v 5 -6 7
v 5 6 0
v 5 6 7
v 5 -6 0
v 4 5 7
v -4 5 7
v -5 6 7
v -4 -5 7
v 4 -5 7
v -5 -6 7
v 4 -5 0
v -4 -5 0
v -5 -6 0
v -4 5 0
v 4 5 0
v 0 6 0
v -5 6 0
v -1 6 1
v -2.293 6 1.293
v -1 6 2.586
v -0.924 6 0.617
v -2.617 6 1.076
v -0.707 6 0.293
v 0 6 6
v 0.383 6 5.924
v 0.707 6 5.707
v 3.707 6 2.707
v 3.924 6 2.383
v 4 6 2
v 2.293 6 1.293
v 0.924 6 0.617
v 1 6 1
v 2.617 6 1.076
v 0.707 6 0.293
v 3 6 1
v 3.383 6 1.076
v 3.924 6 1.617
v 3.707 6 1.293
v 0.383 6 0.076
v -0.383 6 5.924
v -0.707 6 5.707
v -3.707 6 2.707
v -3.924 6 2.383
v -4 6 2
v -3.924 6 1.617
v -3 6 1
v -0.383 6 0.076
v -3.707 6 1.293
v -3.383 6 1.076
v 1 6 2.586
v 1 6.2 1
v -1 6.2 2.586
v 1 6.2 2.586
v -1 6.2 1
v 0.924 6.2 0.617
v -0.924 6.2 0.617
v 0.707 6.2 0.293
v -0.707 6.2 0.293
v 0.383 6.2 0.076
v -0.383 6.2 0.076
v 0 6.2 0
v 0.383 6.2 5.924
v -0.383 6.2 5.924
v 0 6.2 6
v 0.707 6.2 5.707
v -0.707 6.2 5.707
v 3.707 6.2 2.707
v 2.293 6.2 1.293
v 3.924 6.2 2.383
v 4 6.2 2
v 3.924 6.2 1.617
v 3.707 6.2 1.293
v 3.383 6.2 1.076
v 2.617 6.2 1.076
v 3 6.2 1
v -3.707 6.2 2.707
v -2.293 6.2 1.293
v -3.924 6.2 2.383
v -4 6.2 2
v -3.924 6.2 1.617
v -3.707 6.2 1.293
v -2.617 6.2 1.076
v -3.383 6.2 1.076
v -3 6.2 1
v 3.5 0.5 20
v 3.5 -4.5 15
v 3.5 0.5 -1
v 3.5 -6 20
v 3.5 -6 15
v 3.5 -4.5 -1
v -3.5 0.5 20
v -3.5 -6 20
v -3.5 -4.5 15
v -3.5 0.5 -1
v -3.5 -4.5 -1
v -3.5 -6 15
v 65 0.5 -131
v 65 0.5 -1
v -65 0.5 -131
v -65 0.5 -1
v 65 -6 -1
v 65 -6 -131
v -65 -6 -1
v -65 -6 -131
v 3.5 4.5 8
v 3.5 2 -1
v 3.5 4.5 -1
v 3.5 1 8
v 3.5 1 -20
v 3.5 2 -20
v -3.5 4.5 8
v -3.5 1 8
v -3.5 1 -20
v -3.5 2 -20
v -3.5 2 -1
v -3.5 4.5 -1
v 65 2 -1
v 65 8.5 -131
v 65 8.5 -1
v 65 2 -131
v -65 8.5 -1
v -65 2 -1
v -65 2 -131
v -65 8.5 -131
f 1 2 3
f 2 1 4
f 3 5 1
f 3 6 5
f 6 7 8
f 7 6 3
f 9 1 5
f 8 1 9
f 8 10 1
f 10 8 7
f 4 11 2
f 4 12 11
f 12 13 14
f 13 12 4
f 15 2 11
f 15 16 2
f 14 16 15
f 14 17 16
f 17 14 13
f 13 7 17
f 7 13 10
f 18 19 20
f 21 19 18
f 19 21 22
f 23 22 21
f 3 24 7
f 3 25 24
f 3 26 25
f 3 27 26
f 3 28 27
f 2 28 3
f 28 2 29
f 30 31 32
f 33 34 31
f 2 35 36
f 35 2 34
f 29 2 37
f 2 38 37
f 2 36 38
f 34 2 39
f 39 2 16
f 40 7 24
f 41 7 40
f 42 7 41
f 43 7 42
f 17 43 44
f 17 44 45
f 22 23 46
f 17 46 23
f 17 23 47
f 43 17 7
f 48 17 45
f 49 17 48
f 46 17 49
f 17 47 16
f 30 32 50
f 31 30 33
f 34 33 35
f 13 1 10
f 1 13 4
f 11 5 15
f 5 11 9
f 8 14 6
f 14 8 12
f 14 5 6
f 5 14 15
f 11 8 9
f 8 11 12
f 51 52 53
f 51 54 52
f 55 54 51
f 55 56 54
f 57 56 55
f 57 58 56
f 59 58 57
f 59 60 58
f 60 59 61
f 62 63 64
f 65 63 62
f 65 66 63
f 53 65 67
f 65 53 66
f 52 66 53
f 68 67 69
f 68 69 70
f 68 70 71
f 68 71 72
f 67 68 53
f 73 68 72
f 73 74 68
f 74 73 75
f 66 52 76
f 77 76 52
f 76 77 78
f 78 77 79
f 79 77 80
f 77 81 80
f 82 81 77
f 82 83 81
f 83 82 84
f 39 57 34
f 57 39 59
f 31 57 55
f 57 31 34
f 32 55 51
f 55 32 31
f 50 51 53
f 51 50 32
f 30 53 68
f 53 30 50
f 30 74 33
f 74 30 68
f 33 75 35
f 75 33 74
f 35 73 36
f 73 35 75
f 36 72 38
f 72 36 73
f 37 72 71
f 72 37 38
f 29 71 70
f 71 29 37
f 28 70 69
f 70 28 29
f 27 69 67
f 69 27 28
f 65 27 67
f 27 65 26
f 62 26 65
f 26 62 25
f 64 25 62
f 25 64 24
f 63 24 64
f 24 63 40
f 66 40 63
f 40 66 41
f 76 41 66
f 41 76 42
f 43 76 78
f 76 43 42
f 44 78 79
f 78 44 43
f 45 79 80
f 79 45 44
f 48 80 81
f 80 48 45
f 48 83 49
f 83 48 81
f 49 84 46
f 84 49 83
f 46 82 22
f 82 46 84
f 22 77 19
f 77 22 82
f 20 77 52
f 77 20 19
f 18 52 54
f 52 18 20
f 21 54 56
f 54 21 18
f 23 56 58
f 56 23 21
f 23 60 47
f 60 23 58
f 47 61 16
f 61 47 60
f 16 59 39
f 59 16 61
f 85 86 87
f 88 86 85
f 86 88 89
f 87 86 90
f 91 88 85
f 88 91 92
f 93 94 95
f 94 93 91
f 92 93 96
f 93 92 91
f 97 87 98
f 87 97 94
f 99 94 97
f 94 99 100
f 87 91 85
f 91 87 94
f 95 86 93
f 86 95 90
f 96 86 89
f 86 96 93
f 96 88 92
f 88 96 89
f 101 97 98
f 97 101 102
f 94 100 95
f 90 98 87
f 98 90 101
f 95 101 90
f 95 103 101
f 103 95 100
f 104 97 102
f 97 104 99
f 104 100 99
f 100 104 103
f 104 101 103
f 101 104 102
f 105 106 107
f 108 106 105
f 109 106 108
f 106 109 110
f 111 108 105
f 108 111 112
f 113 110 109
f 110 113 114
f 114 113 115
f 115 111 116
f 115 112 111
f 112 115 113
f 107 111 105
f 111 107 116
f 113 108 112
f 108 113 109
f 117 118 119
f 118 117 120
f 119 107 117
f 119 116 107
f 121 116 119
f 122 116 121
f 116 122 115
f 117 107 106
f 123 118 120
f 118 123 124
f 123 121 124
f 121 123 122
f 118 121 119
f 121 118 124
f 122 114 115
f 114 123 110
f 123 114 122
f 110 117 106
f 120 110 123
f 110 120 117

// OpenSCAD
module thin_wall_cube(dims, thick=1) {
    /* centers in XY */
    inner_dim0 = dims[0] - thick * 2;
    inner_dim1 = dims[1] - thick * 2;
    difference() {
        translate([-dims[0]/2,-dims[1]/2,0])
            cube(dims);
        translate([-inner_dim0/2,-inner_dim1/2,-1])
            cube([inner_dim0, inner_dim1, dims[2] + 2]);
    }
}

module arrow(l=10, w=3, r=1) {
    /* stem */
    hull() {
        circle(r=r);
        translate([0,-l]) circle(r=r);
    }
    /* left */
    hull() {
        circle(r=r);
        translate([-w, -w]) circle(r=r);
    }
    /* right */
    hull() {
        circle(r=r);
        translate([w, -w]) circle(r=r);
    }
}
    

union () {
    thin_wall_cube([10,12,7]);
    translate([0,6.2,5]) rotate([90,0,0])
        linear_extrude(height=1)
        arrow(l=4,$fn=16);
}

/* back leg */
translate([-3.5,-4.5,-20])
    cube([7,5,40]);
/* back top retainer */
translate([-3.5,-6,15])
    cube([7,4,5]);
/* back piece */
translate([-130/2,-6,-131])
    cube([130,6.5,130]);

/* front leg */
translate([-3.5,1,-20])
    cube([7,3.5,28]);
/* front piece */
translate([-130/2,2,-131])
    cube([130,6.5,130]);
